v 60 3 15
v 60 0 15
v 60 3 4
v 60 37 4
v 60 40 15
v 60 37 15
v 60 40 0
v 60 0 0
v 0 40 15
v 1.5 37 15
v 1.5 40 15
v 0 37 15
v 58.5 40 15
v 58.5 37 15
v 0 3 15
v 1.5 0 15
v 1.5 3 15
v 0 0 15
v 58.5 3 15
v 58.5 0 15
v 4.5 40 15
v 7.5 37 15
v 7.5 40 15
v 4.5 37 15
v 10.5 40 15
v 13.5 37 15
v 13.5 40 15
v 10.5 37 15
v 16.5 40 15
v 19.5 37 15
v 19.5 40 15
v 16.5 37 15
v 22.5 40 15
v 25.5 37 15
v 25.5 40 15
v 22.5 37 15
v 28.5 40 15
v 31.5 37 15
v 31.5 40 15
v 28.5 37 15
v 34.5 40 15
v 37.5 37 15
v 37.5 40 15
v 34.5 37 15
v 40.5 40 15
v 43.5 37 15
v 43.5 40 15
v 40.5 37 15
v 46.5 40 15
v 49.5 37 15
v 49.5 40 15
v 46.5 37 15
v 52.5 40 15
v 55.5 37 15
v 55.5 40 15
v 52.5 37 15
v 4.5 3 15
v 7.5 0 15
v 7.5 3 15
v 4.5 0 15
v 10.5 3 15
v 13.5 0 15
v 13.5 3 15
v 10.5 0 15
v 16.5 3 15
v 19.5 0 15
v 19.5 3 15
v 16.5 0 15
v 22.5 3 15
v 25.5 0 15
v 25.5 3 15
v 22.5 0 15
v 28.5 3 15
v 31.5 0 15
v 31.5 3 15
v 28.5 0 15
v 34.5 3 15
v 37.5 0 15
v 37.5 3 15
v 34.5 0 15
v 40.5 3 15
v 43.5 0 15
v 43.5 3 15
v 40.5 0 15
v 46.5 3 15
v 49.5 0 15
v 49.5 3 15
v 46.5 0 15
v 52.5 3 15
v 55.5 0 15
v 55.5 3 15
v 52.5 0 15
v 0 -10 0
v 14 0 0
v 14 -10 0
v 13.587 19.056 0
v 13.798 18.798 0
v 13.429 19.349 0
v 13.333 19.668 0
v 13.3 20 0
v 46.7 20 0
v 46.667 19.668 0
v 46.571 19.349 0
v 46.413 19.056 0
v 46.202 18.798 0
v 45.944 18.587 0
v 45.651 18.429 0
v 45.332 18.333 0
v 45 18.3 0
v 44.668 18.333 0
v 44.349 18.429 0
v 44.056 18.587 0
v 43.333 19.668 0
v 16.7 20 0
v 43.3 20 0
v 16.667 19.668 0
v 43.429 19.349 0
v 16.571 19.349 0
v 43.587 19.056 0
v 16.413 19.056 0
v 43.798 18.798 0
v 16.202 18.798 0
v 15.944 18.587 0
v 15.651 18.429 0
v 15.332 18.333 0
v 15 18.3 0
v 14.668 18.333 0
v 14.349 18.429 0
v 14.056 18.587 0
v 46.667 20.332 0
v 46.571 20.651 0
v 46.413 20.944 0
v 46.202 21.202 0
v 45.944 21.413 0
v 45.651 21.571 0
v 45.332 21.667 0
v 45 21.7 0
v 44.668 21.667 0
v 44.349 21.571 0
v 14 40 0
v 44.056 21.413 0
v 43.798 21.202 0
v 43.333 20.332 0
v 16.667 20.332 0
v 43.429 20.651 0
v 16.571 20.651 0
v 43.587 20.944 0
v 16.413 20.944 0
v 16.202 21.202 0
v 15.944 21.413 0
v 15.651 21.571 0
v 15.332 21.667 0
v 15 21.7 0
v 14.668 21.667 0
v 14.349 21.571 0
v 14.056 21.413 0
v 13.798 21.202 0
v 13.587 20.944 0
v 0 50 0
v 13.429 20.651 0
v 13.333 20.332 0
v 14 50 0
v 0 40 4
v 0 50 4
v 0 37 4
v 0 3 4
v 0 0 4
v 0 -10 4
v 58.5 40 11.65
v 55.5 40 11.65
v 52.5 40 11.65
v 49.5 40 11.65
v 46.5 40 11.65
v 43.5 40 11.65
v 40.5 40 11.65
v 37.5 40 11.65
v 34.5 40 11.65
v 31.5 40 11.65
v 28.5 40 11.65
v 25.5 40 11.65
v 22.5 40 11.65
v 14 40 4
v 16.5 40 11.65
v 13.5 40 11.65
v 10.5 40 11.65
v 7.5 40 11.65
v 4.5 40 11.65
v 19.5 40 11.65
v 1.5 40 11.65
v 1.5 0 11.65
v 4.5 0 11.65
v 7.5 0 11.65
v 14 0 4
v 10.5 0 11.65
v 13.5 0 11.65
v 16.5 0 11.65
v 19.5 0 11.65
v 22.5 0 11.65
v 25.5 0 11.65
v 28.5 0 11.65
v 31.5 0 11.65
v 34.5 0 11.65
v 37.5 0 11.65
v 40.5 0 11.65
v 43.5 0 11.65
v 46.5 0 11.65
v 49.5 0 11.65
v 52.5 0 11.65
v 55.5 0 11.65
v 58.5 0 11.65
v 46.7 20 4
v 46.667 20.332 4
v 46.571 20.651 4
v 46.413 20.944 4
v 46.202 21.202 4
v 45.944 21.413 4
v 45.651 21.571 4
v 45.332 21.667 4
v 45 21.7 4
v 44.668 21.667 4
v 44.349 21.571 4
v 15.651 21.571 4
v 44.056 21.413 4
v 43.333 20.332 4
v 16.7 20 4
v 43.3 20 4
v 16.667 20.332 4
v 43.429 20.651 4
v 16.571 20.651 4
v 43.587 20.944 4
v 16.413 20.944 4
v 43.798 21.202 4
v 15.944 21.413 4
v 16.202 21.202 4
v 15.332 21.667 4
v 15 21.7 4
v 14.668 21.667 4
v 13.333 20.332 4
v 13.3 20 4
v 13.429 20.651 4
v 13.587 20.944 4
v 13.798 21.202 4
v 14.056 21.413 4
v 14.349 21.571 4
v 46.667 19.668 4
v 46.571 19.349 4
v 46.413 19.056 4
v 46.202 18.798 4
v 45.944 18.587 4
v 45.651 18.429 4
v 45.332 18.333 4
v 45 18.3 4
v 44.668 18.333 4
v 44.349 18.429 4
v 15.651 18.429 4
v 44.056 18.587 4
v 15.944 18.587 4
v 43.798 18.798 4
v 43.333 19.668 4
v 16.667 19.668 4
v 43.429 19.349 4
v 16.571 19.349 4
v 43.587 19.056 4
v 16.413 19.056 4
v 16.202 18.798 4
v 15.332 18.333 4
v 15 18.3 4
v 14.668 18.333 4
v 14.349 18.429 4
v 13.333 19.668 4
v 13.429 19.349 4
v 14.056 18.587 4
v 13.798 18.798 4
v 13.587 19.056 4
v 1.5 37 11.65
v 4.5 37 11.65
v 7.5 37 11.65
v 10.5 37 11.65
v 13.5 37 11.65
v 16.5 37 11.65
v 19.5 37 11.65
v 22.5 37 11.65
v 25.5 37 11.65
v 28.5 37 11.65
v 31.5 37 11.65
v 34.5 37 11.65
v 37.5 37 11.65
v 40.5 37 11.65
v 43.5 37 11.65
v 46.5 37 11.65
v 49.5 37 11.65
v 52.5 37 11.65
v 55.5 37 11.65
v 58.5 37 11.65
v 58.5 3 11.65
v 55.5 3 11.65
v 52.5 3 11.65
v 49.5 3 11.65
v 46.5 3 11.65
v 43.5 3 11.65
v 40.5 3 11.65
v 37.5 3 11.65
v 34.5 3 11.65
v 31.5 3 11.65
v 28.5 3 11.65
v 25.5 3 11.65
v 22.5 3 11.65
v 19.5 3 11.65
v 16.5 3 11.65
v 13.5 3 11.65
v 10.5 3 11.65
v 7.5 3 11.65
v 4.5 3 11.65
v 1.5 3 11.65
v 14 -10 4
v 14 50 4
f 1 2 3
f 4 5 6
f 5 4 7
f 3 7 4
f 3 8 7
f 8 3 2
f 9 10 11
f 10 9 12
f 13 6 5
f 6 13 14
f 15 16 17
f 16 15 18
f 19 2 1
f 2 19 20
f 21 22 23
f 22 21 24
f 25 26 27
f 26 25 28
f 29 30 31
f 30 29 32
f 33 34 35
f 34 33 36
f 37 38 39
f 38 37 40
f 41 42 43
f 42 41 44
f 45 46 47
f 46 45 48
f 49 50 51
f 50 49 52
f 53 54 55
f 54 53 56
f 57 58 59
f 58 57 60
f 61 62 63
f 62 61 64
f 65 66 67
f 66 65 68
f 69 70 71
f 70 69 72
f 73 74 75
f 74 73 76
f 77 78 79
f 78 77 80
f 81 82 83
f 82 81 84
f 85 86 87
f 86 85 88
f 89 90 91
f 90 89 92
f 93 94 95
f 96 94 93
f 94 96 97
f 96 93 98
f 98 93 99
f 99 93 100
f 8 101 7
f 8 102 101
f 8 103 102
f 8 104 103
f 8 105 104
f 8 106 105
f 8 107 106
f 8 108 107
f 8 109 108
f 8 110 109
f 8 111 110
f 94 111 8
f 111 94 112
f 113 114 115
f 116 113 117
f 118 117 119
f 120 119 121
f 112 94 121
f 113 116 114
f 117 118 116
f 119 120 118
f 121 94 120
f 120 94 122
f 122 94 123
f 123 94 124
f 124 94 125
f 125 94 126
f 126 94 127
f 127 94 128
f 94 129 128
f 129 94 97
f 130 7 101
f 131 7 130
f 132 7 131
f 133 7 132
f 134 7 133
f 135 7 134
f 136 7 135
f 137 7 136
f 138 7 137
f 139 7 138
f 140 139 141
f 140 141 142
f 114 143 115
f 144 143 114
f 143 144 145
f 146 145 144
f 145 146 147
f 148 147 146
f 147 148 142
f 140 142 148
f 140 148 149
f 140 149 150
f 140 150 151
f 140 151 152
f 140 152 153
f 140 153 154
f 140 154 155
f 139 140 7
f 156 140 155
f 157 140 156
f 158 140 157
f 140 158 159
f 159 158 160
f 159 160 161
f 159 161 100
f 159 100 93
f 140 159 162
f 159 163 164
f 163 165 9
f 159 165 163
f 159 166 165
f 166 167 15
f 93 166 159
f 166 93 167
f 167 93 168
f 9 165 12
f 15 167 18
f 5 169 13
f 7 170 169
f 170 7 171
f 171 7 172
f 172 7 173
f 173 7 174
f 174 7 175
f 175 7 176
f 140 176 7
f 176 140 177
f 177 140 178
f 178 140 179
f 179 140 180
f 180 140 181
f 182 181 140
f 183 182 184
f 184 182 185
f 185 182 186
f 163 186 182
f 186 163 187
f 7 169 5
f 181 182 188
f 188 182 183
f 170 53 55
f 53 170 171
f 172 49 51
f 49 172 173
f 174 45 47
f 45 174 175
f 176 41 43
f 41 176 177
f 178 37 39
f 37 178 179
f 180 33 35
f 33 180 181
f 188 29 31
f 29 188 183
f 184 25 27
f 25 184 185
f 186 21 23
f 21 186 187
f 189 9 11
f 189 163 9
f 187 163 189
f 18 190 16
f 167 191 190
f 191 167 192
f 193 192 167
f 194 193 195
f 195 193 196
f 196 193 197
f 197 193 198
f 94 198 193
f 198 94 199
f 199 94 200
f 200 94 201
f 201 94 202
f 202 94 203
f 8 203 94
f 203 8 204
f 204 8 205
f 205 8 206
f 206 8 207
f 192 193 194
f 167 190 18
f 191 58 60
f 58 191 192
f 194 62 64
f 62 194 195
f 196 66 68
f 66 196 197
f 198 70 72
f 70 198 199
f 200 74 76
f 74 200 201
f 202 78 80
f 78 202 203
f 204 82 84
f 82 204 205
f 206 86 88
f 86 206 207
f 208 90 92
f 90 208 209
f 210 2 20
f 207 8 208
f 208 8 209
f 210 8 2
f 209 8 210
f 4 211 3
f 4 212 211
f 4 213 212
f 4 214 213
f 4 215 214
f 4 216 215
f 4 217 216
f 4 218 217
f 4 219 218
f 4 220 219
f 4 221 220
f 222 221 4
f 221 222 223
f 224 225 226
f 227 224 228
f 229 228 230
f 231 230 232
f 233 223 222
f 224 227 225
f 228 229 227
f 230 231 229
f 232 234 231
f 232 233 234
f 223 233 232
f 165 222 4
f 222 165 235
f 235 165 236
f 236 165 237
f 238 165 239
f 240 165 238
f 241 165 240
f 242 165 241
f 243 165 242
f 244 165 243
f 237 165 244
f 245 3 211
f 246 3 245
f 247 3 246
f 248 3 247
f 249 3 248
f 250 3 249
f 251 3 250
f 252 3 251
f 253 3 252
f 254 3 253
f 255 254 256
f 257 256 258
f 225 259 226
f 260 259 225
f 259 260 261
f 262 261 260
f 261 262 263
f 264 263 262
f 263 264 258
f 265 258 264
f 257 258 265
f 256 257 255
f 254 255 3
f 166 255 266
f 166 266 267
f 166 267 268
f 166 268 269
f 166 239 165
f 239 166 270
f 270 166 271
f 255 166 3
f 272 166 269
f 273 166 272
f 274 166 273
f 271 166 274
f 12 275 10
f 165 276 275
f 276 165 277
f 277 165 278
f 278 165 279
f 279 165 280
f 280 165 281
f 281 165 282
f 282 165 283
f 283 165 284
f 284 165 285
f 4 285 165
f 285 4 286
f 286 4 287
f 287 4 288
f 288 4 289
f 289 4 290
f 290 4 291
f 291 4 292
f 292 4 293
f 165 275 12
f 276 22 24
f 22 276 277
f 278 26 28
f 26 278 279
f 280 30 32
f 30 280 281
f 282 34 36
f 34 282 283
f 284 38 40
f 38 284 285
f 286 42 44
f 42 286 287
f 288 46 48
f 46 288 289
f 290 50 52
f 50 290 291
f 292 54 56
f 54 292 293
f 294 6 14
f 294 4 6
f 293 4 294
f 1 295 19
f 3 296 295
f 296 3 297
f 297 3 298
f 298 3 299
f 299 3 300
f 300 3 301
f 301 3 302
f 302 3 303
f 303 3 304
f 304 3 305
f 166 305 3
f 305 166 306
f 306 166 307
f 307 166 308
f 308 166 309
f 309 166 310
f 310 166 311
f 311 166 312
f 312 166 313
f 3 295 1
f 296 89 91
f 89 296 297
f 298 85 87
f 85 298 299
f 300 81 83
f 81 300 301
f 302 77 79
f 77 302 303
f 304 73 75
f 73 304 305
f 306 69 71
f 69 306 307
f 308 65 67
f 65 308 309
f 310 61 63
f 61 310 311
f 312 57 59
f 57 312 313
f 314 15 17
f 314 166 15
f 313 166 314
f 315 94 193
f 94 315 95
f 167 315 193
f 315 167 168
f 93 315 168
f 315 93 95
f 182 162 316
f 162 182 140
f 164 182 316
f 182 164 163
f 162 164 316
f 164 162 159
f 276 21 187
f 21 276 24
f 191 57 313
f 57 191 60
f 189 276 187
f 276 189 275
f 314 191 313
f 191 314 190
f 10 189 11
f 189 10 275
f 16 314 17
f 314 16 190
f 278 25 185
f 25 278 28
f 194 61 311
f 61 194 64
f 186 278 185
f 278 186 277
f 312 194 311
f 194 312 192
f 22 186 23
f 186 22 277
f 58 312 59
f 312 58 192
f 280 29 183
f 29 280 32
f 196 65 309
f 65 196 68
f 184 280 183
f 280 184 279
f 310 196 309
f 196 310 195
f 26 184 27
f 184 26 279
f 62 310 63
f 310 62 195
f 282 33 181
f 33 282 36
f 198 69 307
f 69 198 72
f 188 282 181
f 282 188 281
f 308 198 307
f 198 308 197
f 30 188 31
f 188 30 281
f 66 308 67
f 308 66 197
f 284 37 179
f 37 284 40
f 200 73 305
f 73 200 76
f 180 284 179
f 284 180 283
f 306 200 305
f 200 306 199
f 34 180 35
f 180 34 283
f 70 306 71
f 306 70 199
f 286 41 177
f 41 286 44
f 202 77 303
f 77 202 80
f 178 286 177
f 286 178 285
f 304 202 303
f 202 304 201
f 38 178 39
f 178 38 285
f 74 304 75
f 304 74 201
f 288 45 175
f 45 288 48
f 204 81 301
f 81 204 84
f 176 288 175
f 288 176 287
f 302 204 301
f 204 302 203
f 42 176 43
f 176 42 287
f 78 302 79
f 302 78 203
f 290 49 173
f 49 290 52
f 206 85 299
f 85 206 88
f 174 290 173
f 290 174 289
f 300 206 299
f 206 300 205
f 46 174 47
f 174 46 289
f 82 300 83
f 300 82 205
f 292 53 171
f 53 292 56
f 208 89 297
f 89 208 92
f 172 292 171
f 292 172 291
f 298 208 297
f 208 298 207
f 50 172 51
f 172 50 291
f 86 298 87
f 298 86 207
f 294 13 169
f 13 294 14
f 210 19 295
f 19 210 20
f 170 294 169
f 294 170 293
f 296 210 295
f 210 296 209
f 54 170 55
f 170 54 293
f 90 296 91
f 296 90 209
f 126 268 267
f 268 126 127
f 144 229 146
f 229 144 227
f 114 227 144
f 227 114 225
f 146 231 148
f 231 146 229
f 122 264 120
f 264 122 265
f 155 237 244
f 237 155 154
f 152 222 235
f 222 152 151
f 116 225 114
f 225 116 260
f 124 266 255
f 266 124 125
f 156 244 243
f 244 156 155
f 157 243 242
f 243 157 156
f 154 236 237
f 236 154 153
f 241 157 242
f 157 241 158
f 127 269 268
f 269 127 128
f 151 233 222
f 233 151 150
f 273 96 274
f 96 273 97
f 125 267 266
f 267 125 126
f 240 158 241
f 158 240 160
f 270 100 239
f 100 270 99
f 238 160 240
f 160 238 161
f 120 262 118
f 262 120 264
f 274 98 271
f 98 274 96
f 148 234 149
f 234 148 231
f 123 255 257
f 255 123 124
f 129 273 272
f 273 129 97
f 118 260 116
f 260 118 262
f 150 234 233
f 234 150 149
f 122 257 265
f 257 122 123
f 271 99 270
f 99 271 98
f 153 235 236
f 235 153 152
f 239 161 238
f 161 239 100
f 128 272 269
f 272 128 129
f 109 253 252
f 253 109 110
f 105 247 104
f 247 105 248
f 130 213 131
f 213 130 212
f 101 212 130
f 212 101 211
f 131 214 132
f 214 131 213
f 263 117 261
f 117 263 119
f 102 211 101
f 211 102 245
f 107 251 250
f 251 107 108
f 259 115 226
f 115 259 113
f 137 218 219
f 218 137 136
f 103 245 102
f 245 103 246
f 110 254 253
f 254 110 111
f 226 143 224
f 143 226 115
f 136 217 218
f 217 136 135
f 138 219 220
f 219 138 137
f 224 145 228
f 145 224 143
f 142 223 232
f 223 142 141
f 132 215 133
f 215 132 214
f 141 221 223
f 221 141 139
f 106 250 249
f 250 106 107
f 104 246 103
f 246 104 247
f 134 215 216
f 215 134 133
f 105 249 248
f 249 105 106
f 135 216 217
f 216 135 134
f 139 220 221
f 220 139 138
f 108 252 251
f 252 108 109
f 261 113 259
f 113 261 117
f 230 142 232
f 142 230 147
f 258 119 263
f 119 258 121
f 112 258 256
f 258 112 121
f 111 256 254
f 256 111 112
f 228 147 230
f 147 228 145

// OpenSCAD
$fn = 32;

// ----------------------------------------------------------------------
// Cable duct: 60 x 40 x 15 mm, 10 fingers
// ----------------------------------------------------------------------

// --- parameters (mm) ---
duct_len = 60;            // duct length, X
duct_w = 40;              // duct width, Y
duct_h = 15;              // duct height, Z
wall_t = 3;               // side wall thickness
floor_t = 4;              // floor thickness
slot_w = 3;               // finger slot width
slot_h = 7.65;            // finger slot height
fingers = 10;             // number of finger slots per side
pitch = 6;                // finger pitch
hole_d = 3.4;             // floor mounting hole
hole_n = 2;               // mounting holes in the floor
ear_w = 11;               // mounting ear width
ear_l = 14;               // mounting ear length

module shell() {
  difference() {
    cube([duct_len, duct_w, duct_h]);
    /* open top channel */
    translate([-wall_t - 1, wall_t, floor_t])
      cube([duct_len + 2 * wall_t + 2, duct_w - 2 * wall_t, duct_h + 1]);
  }
}

module ears() {
  translate([0, -ear_w + 1, 0]) cube([ear_l, ear_w, floor_t]);
  translate([0, duct_w - 1, 0]) cube([ear_l, ear_w, floor_t]);
}

difference() {
  union() {
    shell();
    ears();
  }
  /* finger slots cut through both side walls */
  for (i = [0 : fingers - 1]) translate([pitch / 2 + i * pitch - slot_w / 2, -1, floor_t + slot_h]) cube([slot_w, duct_w + 2, duct_h]);
  for (i = [0 : hole_n - 1]) translate([(duct_len / hole_n) * (i + 0.5), duct_w / 2, -1]) cylinder(h = floor_t + 2, d = hole_d);
}
